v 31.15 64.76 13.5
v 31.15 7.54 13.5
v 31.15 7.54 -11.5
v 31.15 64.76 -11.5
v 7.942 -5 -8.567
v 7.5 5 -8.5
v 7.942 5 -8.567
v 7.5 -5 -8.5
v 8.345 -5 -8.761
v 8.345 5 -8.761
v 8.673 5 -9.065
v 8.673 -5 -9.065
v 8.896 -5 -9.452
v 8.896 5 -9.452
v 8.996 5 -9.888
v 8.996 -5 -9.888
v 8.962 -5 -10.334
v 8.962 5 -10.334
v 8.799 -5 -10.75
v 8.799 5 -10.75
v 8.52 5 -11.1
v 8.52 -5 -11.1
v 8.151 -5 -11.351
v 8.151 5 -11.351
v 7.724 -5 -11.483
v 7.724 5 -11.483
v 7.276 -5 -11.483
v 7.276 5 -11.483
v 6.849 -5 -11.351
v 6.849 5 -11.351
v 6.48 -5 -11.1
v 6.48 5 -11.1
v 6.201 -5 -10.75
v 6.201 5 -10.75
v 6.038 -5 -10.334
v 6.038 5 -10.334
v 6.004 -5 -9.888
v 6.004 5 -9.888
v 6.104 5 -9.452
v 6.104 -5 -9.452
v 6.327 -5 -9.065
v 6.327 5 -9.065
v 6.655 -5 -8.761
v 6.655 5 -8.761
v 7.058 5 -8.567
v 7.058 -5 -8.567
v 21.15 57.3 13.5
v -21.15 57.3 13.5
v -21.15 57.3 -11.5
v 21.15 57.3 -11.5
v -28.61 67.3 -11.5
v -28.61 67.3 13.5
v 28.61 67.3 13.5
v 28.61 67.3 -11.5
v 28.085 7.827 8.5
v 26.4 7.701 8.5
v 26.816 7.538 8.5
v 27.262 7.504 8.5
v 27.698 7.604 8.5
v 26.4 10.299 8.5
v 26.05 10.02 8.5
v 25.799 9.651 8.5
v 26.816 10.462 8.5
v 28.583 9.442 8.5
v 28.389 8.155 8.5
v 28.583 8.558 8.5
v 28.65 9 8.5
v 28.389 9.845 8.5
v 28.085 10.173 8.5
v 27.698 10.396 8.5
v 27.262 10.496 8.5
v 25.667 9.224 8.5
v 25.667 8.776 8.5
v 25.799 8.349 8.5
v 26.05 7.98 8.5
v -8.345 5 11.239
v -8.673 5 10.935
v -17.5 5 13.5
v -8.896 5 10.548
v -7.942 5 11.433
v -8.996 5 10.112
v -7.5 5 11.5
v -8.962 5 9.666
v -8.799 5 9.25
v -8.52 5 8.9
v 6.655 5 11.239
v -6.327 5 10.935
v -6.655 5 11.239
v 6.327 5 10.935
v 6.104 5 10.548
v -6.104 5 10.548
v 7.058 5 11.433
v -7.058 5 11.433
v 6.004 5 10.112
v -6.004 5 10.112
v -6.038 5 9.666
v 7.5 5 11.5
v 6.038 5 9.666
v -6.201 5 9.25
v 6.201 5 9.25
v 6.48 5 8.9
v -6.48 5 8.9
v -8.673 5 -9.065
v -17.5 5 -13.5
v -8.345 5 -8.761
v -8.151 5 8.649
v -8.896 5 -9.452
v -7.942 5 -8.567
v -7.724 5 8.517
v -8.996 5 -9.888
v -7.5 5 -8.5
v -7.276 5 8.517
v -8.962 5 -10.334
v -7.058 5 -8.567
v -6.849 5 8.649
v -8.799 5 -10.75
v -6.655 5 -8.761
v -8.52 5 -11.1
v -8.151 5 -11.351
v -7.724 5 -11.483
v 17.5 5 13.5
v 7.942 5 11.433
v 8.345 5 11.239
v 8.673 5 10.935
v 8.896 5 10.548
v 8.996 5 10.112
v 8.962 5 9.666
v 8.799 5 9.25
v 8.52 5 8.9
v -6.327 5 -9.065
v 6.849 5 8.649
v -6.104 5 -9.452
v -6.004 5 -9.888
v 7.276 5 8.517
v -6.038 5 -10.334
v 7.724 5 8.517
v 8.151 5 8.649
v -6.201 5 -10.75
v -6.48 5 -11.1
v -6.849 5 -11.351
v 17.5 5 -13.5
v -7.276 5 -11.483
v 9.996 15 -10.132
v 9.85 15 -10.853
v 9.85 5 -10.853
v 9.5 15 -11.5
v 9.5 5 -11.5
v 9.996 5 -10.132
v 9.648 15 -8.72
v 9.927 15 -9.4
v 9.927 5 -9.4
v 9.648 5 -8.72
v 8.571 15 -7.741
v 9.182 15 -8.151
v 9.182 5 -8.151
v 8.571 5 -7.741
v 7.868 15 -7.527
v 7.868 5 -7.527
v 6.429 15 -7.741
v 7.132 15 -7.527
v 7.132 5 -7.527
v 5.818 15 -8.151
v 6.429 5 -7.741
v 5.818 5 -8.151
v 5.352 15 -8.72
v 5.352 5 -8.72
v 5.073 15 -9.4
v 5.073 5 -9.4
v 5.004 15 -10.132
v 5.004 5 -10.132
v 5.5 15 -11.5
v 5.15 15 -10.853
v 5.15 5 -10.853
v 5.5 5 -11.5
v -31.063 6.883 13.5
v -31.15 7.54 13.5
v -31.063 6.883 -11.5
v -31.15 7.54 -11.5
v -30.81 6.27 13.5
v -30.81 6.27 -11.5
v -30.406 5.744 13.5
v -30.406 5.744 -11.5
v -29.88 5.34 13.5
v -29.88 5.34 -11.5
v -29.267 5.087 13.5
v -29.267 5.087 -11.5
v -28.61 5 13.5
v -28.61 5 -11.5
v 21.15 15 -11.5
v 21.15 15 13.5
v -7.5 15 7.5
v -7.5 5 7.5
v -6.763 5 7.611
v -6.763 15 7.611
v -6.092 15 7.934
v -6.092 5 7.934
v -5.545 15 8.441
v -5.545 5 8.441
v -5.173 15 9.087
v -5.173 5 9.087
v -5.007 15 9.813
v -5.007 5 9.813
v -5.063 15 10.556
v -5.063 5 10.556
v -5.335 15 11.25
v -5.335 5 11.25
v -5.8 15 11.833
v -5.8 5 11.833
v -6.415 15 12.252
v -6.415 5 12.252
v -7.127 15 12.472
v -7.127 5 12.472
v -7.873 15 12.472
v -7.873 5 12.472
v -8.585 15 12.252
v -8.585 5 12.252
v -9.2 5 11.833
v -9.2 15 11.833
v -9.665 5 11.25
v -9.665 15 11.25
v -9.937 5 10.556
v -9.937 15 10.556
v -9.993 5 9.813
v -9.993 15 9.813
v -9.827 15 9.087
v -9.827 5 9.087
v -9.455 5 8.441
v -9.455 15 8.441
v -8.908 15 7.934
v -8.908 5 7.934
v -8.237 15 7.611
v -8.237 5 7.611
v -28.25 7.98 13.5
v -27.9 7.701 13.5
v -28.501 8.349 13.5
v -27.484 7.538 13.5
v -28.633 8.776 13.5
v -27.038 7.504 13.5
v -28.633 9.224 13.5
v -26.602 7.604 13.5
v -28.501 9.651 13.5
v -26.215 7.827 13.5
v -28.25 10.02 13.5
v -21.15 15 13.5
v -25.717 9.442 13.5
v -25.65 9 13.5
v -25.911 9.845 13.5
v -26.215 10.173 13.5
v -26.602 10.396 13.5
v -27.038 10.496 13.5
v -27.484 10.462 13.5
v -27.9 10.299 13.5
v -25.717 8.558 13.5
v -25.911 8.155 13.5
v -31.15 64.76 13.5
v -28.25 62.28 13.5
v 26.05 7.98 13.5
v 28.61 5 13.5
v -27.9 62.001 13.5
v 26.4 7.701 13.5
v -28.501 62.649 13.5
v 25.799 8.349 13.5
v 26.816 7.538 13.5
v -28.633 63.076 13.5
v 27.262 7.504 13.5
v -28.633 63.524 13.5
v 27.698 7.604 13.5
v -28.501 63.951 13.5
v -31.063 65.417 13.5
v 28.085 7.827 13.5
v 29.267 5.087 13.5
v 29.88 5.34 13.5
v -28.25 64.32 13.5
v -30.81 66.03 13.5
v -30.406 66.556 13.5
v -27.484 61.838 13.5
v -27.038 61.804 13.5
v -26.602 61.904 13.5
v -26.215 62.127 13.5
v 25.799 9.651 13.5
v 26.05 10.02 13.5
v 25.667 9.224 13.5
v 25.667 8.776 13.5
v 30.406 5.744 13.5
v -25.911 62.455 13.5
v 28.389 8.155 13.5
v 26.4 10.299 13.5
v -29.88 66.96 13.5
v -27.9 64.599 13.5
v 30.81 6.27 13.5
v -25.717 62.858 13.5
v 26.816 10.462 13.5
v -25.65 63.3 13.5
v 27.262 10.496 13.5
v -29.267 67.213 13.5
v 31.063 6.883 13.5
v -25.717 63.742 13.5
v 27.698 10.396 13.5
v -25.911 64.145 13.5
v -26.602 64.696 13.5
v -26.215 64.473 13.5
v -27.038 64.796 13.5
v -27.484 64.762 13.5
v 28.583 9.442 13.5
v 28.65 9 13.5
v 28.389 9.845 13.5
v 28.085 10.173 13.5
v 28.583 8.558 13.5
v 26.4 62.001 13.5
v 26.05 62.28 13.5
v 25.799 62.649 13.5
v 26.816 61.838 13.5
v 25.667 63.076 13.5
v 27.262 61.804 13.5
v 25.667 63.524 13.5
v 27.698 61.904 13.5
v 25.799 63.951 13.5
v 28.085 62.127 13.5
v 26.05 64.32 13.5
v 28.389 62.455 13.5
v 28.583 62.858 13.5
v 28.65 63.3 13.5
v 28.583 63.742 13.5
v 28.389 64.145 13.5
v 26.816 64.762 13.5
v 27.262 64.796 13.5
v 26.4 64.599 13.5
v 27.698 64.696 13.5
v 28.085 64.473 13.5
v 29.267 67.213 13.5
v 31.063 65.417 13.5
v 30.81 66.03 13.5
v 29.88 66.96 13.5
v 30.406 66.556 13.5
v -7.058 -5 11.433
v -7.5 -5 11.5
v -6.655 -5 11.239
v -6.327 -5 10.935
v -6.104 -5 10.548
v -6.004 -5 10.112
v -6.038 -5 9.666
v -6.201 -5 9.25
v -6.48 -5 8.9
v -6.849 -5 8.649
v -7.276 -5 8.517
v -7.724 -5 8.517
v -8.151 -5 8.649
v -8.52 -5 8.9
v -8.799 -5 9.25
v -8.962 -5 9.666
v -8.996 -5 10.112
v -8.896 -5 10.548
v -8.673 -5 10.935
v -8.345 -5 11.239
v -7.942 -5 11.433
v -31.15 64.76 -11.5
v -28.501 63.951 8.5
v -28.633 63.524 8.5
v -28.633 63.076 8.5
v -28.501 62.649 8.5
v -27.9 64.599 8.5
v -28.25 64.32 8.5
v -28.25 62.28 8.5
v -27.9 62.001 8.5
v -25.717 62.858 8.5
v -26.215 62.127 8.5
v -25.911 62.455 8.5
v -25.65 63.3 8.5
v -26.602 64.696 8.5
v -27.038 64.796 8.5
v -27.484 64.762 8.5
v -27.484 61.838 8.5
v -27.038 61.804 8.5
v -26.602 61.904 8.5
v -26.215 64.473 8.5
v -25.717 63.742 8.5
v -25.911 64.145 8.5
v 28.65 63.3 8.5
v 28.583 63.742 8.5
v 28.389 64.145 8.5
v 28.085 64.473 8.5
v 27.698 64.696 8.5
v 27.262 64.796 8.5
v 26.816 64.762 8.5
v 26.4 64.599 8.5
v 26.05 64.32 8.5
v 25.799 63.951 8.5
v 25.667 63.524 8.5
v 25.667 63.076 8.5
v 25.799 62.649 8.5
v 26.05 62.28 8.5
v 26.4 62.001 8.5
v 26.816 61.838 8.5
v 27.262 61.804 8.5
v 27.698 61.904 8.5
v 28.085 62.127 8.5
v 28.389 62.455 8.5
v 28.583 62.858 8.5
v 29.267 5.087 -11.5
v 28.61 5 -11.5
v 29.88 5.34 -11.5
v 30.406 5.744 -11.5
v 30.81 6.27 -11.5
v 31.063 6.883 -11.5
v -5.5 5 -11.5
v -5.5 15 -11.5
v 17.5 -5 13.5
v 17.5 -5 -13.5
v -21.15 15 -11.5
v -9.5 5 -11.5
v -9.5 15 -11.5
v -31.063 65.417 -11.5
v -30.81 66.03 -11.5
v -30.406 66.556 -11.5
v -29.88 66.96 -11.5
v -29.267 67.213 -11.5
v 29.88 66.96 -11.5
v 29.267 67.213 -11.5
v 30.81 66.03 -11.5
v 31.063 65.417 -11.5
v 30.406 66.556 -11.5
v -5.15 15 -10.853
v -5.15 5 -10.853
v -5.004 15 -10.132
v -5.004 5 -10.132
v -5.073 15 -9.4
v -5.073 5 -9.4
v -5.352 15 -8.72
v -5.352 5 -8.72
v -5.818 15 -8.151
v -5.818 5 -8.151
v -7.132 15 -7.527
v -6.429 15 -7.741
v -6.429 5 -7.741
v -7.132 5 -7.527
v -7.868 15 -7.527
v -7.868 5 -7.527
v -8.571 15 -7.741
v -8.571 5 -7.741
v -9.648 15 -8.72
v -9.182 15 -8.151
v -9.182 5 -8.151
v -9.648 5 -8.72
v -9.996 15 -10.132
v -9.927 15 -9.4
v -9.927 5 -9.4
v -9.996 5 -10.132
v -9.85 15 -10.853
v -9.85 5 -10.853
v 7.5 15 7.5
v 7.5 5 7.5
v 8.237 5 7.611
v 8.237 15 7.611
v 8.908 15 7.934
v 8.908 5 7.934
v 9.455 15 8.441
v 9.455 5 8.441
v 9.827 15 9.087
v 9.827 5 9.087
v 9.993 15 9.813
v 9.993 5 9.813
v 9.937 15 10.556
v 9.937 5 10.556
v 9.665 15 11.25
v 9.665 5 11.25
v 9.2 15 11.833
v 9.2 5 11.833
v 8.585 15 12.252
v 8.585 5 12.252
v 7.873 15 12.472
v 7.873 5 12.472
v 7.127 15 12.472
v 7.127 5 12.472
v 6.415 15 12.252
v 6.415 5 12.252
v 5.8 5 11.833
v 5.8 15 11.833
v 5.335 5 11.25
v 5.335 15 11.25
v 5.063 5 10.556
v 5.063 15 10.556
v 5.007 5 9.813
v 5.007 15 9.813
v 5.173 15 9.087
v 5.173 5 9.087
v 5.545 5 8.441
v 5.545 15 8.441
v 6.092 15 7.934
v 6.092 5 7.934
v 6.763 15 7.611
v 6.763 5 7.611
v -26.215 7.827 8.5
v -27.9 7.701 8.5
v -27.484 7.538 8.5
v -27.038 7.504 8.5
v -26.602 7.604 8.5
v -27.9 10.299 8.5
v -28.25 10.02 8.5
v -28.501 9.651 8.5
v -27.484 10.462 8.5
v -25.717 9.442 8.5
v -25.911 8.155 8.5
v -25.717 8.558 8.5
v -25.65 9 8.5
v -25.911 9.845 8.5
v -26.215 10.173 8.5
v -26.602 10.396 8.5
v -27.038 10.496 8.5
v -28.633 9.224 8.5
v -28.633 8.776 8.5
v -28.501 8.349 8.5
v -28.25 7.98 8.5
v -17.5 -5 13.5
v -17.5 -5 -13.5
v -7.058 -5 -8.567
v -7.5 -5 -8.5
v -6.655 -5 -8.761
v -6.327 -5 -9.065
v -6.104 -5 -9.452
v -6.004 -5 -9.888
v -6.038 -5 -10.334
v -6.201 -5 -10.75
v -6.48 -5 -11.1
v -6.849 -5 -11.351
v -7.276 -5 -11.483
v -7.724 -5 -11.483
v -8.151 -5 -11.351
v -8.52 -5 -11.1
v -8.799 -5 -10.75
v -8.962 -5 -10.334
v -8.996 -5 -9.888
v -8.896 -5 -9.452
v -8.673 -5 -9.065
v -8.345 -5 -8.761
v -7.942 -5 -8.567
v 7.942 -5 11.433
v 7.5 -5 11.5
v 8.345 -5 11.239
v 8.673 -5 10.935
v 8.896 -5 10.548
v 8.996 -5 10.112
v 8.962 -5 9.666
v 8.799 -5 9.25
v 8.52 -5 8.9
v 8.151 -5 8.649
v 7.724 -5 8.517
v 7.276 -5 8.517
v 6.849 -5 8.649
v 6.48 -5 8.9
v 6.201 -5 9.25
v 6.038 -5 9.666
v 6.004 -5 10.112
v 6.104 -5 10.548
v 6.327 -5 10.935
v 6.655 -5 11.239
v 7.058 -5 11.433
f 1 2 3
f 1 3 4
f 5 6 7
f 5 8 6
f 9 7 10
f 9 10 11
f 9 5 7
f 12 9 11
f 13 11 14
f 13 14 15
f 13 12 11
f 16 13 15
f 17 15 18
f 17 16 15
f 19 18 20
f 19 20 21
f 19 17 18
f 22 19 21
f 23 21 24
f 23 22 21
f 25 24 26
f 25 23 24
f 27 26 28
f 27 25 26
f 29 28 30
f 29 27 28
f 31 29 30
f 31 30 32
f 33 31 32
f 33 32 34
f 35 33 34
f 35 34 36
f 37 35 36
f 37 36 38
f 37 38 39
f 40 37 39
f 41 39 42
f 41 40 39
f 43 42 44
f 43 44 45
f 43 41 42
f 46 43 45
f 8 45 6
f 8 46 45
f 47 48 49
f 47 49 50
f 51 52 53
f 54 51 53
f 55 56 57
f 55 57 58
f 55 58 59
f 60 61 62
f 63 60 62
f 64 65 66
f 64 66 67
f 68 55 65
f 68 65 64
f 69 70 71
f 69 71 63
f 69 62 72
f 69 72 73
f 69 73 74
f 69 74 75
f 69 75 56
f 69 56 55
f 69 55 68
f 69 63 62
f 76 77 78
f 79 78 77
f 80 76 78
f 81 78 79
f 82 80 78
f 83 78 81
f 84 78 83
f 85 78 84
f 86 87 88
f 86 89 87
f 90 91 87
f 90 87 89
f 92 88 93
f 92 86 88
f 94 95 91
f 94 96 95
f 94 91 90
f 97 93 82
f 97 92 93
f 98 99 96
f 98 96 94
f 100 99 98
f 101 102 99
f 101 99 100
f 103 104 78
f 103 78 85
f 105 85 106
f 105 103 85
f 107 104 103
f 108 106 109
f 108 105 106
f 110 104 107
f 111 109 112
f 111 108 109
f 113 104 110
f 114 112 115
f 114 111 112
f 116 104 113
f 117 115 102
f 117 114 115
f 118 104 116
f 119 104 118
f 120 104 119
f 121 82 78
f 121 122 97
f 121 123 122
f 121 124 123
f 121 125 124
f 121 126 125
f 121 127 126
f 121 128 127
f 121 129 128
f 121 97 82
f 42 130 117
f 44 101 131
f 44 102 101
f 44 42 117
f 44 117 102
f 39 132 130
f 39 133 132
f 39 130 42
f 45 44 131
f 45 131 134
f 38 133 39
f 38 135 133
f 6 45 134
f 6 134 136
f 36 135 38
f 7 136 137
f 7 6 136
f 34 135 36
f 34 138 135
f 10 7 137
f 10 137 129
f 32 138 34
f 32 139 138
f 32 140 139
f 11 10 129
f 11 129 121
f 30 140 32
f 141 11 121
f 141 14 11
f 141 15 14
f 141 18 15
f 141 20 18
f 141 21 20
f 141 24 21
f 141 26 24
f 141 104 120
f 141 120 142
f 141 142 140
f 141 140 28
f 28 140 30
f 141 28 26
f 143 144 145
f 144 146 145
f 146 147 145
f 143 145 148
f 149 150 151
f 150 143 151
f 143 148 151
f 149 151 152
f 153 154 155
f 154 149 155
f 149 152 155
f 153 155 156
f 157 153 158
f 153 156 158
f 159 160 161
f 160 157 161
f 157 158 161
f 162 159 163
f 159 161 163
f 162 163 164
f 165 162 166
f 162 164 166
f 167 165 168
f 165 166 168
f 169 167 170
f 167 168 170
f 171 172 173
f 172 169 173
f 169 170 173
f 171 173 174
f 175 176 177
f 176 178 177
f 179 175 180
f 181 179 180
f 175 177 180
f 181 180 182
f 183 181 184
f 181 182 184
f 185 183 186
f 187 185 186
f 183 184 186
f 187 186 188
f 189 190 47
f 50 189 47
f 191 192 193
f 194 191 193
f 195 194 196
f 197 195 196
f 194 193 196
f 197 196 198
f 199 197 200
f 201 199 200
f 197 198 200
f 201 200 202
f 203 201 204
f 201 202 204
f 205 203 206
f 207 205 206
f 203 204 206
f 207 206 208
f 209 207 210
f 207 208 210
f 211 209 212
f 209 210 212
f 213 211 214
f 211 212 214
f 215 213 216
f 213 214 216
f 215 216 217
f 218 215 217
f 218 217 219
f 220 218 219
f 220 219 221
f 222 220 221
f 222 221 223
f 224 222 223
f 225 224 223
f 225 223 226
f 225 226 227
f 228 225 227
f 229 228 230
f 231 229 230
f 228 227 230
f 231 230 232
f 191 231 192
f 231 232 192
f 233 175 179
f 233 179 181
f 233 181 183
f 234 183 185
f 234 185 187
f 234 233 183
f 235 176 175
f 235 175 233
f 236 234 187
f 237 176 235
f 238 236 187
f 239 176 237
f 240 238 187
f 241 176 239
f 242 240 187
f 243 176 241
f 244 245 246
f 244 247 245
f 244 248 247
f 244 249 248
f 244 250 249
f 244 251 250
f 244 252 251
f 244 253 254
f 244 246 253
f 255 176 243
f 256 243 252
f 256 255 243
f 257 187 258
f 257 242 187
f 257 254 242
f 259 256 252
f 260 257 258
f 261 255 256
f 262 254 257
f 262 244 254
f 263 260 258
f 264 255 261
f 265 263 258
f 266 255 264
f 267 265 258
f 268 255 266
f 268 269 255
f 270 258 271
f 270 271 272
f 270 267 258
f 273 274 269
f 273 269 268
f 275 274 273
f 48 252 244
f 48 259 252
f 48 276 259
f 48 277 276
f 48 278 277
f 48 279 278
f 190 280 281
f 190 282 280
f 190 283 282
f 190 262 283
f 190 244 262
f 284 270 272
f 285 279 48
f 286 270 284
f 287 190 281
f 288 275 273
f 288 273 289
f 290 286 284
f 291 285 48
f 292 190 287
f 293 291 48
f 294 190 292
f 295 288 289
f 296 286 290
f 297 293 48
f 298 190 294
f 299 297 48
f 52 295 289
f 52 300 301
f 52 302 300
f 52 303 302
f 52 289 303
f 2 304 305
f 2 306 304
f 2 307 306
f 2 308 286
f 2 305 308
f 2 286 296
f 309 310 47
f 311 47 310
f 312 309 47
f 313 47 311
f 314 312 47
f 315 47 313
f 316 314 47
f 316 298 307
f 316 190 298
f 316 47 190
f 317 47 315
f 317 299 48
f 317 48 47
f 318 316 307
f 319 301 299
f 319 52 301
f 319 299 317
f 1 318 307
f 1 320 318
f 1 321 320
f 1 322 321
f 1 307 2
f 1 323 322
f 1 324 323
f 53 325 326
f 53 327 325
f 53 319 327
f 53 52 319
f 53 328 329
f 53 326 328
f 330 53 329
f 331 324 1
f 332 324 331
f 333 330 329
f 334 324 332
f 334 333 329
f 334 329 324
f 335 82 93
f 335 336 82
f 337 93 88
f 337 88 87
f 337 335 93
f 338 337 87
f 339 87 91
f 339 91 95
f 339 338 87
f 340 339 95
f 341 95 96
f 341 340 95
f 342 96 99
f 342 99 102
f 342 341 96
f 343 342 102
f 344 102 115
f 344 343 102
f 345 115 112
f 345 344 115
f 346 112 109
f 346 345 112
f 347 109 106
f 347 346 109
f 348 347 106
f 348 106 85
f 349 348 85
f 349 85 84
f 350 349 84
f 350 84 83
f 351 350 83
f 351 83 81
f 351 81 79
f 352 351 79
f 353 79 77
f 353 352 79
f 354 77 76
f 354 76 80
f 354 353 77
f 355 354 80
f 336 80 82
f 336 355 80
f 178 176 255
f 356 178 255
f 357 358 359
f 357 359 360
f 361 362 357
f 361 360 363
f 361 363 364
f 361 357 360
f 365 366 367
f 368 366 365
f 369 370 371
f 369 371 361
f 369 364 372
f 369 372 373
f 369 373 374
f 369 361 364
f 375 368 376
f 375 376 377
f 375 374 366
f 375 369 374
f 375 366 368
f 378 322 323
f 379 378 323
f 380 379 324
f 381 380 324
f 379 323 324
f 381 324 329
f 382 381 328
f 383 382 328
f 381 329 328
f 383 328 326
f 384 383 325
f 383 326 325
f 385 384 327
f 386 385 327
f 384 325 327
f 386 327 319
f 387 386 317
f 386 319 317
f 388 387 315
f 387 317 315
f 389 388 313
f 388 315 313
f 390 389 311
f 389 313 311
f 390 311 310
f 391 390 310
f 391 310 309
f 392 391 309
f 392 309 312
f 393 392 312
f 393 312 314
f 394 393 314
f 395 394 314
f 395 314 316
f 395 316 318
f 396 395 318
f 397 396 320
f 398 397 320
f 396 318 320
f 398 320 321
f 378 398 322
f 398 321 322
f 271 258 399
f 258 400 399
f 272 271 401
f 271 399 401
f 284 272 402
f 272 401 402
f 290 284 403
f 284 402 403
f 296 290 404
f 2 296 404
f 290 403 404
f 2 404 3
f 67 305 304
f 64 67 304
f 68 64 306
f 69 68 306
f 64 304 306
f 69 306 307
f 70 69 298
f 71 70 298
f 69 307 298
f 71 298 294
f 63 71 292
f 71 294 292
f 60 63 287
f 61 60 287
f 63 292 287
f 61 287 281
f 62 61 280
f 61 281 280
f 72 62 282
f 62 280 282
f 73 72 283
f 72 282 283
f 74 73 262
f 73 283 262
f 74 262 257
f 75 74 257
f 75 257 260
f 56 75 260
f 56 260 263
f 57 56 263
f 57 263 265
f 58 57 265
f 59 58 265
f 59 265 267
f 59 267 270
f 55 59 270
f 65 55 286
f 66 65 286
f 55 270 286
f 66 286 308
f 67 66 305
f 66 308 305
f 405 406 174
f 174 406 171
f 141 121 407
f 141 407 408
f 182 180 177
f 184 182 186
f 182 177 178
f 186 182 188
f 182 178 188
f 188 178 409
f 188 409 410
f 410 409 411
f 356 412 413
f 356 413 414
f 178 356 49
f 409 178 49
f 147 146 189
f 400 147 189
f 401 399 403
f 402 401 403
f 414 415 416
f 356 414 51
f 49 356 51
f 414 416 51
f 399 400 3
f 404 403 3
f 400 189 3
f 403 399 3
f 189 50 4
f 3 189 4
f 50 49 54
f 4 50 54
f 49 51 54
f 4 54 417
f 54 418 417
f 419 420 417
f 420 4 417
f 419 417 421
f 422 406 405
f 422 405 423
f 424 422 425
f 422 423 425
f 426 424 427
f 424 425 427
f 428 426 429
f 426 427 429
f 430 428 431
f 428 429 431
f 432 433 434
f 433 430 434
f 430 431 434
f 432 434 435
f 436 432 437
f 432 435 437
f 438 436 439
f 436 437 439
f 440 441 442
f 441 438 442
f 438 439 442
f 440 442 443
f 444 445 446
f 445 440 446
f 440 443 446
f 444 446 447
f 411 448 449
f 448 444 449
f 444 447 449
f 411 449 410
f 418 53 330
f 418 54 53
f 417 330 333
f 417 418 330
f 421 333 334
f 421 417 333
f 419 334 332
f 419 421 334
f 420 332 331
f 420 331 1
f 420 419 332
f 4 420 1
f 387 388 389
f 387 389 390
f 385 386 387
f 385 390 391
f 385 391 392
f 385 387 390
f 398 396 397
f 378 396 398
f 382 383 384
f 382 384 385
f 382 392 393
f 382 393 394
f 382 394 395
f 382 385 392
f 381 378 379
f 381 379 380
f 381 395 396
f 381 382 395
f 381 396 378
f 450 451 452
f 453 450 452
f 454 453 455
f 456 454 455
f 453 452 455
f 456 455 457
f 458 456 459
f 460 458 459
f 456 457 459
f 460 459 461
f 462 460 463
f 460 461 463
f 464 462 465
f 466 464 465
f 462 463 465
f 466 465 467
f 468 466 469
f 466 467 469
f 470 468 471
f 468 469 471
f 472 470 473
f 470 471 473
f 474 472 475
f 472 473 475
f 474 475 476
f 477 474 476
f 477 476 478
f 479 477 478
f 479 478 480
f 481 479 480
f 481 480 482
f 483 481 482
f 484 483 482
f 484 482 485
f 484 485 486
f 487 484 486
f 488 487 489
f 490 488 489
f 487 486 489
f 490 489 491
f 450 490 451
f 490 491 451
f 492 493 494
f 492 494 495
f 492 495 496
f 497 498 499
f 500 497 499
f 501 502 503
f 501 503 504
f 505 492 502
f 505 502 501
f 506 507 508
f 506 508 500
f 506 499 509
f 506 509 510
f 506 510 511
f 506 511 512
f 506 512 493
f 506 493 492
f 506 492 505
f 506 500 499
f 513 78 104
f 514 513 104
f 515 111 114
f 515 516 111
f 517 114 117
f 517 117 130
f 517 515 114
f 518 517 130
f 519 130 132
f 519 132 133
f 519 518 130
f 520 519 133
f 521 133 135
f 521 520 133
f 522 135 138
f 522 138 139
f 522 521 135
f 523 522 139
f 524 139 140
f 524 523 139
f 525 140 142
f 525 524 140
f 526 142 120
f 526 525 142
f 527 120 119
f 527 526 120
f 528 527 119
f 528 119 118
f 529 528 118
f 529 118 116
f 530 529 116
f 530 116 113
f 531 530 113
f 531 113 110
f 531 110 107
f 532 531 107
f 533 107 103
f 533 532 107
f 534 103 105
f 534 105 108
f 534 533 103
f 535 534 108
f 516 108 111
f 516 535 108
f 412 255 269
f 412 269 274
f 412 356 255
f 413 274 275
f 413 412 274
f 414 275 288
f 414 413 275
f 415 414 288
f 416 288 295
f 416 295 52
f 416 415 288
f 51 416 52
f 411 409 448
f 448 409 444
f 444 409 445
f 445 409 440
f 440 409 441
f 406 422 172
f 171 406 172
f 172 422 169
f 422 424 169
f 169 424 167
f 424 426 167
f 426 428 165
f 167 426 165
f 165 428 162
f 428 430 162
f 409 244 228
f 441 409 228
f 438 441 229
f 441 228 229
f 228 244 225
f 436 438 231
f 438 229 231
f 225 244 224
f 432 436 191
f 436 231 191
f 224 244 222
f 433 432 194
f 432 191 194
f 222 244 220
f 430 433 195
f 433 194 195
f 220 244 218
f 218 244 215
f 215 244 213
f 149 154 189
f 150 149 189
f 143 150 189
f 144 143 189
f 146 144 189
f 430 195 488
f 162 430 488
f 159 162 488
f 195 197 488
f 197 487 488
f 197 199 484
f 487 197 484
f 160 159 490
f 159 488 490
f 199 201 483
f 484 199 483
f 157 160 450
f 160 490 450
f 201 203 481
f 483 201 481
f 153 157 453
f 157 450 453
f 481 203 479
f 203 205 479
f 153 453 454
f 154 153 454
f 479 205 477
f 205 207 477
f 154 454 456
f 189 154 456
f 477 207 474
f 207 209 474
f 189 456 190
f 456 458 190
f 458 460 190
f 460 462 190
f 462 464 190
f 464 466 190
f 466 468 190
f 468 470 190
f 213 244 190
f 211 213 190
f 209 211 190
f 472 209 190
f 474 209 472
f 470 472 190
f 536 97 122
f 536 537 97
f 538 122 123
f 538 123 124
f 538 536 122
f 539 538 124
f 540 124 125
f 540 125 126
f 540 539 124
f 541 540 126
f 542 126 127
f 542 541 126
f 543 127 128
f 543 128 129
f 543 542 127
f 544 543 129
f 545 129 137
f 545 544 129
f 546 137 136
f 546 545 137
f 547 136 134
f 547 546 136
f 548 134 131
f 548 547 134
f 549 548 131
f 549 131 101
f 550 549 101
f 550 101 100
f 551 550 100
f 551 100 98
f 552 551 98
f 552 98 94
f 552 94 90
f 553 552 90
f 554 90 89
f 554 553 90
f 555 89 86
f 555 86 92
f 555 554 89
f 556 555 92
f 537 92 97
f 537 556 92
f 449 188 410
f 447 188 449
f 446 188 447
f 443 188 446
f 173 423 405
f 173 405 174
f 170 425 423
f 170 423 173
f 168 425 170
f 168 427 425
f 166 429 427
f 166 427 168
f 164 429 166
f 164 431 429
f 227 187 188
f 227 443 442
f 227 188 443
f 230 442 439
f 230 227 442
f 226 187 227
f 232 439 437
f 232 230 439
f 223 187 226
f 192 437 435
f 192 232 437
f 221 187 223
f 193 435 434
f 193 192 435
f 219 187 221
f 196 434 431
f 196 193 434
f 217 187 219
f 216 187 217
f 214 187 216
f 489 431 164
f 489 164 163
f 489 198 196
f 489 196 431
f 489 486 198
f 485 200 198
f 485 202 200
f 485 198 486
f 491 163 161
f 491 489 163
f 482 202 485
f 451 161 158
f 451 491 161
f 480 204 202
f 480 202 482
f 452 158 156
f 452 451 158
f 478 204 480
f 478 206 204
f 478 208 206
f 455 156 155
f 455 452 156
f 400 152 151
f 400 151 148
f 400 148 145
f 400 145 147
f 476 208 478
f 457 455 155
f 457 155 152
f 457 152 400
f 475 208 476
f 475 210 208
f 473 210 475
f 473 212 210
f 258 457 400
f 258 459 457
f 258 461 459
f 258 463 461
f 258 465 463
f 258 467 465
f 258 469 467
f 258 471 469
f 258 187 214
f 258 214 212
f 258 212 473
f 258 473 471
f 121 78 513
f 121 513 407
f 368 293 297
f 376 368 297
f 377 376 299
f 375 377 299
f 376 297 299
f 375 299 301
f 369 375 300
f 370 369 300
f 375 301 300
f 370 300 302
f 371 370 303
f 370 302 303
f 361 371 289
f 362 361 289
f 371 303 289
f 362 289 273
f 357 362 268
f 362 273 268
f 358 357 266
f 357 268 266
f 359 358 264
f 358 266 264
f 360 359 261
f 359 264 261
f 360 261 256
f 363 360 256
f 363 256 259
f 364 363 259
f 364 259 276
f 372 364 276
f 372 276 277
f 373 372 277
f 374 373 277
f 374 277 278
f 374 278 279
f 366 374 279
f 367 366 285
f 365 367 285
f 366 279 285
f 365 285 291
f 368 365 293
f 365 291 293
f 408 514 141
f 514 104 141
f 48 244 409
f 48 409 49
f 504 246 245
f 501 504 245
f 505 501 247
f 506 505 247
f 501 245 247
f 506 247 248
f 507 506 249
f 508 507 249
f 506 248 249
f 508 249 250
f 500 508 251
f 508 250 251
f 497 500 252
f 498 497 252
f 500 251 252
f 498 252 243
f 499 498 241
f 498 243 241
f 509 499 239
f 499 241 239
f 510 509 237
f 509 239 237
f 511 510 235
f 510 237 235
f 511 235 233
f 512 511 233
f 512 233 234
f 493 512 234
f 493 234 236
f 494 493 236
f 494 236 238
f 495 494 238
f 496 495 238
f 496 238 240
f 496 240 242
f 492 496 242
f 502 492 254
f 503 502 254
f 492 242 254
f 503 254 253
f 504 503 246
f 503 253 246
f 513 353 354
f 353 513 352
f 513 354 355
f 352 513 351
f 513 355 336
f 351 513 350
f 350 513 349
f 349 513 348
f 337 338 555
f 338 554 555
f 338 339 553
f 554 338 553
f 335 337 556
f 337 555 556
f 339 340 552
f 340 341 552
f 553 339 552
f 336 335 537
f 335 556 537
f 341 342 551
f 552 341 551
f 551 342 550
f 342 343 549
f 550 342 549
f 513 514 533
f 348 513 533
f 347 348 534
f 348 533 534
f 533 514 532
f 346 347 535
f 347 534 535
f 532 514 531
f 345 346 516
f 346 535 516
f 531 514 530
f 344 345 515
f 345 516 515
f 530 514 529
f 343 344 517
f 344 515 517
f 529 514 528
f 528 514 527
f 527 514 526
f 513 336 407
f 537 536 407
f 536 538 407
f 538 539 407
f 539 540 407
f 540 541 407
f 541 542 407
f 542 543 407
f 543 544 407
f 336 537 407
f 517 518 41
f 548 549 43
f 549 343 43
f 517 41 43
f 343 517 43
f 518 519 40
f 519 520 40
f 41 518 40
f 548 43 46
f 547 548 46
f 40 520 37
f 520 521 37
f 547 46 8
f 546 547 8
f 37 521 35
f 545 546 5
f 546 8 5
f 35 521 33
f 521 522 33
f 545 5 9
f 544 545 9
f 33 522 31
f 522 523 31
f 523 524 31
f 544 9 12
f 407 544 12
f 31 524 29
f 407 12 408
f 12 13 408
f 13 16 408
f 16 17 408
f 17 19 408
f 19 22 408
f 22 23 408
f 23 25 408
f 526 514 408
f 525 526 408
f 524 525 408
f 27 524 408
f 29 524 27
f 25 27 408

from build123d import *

# Parameters (mm, degrees)
SKETCH1_W           = 35
SKETCH1_H           = 27
SKETCH1_R           = 1.500000048
BOSS_EXTRUDE1_DEPTH = 5
SKETCH2_W           = 62.3
SKETCH2_H           = 62.3
SKETCH2_W_2         = 42.3
SKETCH2_H_2         = 42.3
BOSS_EXTRUDE2_DEPTH = 25
SKETCH3_R           = 2.5
CUT_EXTRUDE2_DEPTH  = 10
SKETCH4_R           = 1.5
CUT_EXTRUDE3_DEPTH  = 5
FILLET1_R           = 2.54


with BuildPart() as part:
    # Sketch1 → Boss-Extrude1 (new, symmetric)
    with BuildSketch(Plane(origin=(0, 0, 0), x_dir=(1, 0, 0), z_dir=(0, 1, 0))):
        Rectangle(SKETCH1_W, SKETCH1_H)
        with Locations(Location((-7.499999986, 9.999999939, 0), (0, 0, 270))):
            Circle(SKETCH1_R, mode=Mode.SUBTRACT)
        with Locations(Location((7.499999986, 9.999999939, 0), (0, 0, 270))):
            Circle(SKETCH1_R, mode=Mode.SUBTRACT)
        with Locations(Location((7.499999986, -9.999999939, 0), (0, 0, 270))):
            Circle(SKETCH1_R, mode=Mode.SUBTRACT)
        with Locations(Location((-7.499999986, -9.999999939, 0), (0, 0, 270))):
            Circle(SKETCH1_R, mode=Mode.SUBTRACT)
    extrude(amount=BOSS_EXTRUDE1_DEPTH, both=True)


with BuildPart() as body_2:
    # Sketch2 → Boss-Extrude2 (new body)
    with BuildSketch(Plane.XY.offset(13.5)):
        with Locations((0, 36.15)):
            Rectangle(SKETCH2_W, SKETCH2_H)
        with Locations((0, 36.15)):
            Rectangle(SKETCH2_W_2, SKETCH2_H_2, mode=Mode.SUBTRACT)
    extrude(amount=-BOSS_EXTRUDE2_DEPTH)

    # Sketch3 → Cut-Extrude2 (cut)
    with BuildSketch(Plane.XZ.offset(-5)):
        with Locations(Location((-7.499999986, 9.999999939, 0), (0, 0, 270))):
            Circle(SKETCH3_R)
        with Locations(Location((7.499999986, 9.999999939, 0), (0, 0, 270))):
            Circle(SKETCH3_R)
        with Locations((7.499999986, -9.999999939)):
            Circle(SKETCH3_R)
        with Locations((-7.499999986, -9.999999939)):
            Circle(SKETCH3_R)
    extrude(amount=-CUT_EXTRUDE2_DEPTH, mode=Mode.SUBTRACT)

    # Sketch4 → Cut-Extrude3 (cut)
    with BuildSketch(Plane.XY.offset(13.5)):
        with Locations((-27.15, 63.3)):
            Circle(SKETCH4_R)
        with Locations((27.15, 63.3)):
            Circle(SKETCH4_R)
        with Locations((27.15, 9)):
            Circle(SKETCH4_R)
        with Locations((-27.15, 9)):
            Circle(SKETCH4_R)
    extrude(amount=-CUT_EXTRUDE3_DEPTH, mode=Mode.SUBTRACT)

    # Fillet1
    fillet1_edges = [body_2.edges().sort_by_distance(p)[0] for p in [
        (31.15, 5, 1),
        (-31.15, 5, 1),
        (-31.15, 67.3, 1),
        (31.15, 67.3, 1),
    ]]
    fillet(fillet1_edges, radius=FILLET1_R)


solid = Compound([part.part, body_2.part])
